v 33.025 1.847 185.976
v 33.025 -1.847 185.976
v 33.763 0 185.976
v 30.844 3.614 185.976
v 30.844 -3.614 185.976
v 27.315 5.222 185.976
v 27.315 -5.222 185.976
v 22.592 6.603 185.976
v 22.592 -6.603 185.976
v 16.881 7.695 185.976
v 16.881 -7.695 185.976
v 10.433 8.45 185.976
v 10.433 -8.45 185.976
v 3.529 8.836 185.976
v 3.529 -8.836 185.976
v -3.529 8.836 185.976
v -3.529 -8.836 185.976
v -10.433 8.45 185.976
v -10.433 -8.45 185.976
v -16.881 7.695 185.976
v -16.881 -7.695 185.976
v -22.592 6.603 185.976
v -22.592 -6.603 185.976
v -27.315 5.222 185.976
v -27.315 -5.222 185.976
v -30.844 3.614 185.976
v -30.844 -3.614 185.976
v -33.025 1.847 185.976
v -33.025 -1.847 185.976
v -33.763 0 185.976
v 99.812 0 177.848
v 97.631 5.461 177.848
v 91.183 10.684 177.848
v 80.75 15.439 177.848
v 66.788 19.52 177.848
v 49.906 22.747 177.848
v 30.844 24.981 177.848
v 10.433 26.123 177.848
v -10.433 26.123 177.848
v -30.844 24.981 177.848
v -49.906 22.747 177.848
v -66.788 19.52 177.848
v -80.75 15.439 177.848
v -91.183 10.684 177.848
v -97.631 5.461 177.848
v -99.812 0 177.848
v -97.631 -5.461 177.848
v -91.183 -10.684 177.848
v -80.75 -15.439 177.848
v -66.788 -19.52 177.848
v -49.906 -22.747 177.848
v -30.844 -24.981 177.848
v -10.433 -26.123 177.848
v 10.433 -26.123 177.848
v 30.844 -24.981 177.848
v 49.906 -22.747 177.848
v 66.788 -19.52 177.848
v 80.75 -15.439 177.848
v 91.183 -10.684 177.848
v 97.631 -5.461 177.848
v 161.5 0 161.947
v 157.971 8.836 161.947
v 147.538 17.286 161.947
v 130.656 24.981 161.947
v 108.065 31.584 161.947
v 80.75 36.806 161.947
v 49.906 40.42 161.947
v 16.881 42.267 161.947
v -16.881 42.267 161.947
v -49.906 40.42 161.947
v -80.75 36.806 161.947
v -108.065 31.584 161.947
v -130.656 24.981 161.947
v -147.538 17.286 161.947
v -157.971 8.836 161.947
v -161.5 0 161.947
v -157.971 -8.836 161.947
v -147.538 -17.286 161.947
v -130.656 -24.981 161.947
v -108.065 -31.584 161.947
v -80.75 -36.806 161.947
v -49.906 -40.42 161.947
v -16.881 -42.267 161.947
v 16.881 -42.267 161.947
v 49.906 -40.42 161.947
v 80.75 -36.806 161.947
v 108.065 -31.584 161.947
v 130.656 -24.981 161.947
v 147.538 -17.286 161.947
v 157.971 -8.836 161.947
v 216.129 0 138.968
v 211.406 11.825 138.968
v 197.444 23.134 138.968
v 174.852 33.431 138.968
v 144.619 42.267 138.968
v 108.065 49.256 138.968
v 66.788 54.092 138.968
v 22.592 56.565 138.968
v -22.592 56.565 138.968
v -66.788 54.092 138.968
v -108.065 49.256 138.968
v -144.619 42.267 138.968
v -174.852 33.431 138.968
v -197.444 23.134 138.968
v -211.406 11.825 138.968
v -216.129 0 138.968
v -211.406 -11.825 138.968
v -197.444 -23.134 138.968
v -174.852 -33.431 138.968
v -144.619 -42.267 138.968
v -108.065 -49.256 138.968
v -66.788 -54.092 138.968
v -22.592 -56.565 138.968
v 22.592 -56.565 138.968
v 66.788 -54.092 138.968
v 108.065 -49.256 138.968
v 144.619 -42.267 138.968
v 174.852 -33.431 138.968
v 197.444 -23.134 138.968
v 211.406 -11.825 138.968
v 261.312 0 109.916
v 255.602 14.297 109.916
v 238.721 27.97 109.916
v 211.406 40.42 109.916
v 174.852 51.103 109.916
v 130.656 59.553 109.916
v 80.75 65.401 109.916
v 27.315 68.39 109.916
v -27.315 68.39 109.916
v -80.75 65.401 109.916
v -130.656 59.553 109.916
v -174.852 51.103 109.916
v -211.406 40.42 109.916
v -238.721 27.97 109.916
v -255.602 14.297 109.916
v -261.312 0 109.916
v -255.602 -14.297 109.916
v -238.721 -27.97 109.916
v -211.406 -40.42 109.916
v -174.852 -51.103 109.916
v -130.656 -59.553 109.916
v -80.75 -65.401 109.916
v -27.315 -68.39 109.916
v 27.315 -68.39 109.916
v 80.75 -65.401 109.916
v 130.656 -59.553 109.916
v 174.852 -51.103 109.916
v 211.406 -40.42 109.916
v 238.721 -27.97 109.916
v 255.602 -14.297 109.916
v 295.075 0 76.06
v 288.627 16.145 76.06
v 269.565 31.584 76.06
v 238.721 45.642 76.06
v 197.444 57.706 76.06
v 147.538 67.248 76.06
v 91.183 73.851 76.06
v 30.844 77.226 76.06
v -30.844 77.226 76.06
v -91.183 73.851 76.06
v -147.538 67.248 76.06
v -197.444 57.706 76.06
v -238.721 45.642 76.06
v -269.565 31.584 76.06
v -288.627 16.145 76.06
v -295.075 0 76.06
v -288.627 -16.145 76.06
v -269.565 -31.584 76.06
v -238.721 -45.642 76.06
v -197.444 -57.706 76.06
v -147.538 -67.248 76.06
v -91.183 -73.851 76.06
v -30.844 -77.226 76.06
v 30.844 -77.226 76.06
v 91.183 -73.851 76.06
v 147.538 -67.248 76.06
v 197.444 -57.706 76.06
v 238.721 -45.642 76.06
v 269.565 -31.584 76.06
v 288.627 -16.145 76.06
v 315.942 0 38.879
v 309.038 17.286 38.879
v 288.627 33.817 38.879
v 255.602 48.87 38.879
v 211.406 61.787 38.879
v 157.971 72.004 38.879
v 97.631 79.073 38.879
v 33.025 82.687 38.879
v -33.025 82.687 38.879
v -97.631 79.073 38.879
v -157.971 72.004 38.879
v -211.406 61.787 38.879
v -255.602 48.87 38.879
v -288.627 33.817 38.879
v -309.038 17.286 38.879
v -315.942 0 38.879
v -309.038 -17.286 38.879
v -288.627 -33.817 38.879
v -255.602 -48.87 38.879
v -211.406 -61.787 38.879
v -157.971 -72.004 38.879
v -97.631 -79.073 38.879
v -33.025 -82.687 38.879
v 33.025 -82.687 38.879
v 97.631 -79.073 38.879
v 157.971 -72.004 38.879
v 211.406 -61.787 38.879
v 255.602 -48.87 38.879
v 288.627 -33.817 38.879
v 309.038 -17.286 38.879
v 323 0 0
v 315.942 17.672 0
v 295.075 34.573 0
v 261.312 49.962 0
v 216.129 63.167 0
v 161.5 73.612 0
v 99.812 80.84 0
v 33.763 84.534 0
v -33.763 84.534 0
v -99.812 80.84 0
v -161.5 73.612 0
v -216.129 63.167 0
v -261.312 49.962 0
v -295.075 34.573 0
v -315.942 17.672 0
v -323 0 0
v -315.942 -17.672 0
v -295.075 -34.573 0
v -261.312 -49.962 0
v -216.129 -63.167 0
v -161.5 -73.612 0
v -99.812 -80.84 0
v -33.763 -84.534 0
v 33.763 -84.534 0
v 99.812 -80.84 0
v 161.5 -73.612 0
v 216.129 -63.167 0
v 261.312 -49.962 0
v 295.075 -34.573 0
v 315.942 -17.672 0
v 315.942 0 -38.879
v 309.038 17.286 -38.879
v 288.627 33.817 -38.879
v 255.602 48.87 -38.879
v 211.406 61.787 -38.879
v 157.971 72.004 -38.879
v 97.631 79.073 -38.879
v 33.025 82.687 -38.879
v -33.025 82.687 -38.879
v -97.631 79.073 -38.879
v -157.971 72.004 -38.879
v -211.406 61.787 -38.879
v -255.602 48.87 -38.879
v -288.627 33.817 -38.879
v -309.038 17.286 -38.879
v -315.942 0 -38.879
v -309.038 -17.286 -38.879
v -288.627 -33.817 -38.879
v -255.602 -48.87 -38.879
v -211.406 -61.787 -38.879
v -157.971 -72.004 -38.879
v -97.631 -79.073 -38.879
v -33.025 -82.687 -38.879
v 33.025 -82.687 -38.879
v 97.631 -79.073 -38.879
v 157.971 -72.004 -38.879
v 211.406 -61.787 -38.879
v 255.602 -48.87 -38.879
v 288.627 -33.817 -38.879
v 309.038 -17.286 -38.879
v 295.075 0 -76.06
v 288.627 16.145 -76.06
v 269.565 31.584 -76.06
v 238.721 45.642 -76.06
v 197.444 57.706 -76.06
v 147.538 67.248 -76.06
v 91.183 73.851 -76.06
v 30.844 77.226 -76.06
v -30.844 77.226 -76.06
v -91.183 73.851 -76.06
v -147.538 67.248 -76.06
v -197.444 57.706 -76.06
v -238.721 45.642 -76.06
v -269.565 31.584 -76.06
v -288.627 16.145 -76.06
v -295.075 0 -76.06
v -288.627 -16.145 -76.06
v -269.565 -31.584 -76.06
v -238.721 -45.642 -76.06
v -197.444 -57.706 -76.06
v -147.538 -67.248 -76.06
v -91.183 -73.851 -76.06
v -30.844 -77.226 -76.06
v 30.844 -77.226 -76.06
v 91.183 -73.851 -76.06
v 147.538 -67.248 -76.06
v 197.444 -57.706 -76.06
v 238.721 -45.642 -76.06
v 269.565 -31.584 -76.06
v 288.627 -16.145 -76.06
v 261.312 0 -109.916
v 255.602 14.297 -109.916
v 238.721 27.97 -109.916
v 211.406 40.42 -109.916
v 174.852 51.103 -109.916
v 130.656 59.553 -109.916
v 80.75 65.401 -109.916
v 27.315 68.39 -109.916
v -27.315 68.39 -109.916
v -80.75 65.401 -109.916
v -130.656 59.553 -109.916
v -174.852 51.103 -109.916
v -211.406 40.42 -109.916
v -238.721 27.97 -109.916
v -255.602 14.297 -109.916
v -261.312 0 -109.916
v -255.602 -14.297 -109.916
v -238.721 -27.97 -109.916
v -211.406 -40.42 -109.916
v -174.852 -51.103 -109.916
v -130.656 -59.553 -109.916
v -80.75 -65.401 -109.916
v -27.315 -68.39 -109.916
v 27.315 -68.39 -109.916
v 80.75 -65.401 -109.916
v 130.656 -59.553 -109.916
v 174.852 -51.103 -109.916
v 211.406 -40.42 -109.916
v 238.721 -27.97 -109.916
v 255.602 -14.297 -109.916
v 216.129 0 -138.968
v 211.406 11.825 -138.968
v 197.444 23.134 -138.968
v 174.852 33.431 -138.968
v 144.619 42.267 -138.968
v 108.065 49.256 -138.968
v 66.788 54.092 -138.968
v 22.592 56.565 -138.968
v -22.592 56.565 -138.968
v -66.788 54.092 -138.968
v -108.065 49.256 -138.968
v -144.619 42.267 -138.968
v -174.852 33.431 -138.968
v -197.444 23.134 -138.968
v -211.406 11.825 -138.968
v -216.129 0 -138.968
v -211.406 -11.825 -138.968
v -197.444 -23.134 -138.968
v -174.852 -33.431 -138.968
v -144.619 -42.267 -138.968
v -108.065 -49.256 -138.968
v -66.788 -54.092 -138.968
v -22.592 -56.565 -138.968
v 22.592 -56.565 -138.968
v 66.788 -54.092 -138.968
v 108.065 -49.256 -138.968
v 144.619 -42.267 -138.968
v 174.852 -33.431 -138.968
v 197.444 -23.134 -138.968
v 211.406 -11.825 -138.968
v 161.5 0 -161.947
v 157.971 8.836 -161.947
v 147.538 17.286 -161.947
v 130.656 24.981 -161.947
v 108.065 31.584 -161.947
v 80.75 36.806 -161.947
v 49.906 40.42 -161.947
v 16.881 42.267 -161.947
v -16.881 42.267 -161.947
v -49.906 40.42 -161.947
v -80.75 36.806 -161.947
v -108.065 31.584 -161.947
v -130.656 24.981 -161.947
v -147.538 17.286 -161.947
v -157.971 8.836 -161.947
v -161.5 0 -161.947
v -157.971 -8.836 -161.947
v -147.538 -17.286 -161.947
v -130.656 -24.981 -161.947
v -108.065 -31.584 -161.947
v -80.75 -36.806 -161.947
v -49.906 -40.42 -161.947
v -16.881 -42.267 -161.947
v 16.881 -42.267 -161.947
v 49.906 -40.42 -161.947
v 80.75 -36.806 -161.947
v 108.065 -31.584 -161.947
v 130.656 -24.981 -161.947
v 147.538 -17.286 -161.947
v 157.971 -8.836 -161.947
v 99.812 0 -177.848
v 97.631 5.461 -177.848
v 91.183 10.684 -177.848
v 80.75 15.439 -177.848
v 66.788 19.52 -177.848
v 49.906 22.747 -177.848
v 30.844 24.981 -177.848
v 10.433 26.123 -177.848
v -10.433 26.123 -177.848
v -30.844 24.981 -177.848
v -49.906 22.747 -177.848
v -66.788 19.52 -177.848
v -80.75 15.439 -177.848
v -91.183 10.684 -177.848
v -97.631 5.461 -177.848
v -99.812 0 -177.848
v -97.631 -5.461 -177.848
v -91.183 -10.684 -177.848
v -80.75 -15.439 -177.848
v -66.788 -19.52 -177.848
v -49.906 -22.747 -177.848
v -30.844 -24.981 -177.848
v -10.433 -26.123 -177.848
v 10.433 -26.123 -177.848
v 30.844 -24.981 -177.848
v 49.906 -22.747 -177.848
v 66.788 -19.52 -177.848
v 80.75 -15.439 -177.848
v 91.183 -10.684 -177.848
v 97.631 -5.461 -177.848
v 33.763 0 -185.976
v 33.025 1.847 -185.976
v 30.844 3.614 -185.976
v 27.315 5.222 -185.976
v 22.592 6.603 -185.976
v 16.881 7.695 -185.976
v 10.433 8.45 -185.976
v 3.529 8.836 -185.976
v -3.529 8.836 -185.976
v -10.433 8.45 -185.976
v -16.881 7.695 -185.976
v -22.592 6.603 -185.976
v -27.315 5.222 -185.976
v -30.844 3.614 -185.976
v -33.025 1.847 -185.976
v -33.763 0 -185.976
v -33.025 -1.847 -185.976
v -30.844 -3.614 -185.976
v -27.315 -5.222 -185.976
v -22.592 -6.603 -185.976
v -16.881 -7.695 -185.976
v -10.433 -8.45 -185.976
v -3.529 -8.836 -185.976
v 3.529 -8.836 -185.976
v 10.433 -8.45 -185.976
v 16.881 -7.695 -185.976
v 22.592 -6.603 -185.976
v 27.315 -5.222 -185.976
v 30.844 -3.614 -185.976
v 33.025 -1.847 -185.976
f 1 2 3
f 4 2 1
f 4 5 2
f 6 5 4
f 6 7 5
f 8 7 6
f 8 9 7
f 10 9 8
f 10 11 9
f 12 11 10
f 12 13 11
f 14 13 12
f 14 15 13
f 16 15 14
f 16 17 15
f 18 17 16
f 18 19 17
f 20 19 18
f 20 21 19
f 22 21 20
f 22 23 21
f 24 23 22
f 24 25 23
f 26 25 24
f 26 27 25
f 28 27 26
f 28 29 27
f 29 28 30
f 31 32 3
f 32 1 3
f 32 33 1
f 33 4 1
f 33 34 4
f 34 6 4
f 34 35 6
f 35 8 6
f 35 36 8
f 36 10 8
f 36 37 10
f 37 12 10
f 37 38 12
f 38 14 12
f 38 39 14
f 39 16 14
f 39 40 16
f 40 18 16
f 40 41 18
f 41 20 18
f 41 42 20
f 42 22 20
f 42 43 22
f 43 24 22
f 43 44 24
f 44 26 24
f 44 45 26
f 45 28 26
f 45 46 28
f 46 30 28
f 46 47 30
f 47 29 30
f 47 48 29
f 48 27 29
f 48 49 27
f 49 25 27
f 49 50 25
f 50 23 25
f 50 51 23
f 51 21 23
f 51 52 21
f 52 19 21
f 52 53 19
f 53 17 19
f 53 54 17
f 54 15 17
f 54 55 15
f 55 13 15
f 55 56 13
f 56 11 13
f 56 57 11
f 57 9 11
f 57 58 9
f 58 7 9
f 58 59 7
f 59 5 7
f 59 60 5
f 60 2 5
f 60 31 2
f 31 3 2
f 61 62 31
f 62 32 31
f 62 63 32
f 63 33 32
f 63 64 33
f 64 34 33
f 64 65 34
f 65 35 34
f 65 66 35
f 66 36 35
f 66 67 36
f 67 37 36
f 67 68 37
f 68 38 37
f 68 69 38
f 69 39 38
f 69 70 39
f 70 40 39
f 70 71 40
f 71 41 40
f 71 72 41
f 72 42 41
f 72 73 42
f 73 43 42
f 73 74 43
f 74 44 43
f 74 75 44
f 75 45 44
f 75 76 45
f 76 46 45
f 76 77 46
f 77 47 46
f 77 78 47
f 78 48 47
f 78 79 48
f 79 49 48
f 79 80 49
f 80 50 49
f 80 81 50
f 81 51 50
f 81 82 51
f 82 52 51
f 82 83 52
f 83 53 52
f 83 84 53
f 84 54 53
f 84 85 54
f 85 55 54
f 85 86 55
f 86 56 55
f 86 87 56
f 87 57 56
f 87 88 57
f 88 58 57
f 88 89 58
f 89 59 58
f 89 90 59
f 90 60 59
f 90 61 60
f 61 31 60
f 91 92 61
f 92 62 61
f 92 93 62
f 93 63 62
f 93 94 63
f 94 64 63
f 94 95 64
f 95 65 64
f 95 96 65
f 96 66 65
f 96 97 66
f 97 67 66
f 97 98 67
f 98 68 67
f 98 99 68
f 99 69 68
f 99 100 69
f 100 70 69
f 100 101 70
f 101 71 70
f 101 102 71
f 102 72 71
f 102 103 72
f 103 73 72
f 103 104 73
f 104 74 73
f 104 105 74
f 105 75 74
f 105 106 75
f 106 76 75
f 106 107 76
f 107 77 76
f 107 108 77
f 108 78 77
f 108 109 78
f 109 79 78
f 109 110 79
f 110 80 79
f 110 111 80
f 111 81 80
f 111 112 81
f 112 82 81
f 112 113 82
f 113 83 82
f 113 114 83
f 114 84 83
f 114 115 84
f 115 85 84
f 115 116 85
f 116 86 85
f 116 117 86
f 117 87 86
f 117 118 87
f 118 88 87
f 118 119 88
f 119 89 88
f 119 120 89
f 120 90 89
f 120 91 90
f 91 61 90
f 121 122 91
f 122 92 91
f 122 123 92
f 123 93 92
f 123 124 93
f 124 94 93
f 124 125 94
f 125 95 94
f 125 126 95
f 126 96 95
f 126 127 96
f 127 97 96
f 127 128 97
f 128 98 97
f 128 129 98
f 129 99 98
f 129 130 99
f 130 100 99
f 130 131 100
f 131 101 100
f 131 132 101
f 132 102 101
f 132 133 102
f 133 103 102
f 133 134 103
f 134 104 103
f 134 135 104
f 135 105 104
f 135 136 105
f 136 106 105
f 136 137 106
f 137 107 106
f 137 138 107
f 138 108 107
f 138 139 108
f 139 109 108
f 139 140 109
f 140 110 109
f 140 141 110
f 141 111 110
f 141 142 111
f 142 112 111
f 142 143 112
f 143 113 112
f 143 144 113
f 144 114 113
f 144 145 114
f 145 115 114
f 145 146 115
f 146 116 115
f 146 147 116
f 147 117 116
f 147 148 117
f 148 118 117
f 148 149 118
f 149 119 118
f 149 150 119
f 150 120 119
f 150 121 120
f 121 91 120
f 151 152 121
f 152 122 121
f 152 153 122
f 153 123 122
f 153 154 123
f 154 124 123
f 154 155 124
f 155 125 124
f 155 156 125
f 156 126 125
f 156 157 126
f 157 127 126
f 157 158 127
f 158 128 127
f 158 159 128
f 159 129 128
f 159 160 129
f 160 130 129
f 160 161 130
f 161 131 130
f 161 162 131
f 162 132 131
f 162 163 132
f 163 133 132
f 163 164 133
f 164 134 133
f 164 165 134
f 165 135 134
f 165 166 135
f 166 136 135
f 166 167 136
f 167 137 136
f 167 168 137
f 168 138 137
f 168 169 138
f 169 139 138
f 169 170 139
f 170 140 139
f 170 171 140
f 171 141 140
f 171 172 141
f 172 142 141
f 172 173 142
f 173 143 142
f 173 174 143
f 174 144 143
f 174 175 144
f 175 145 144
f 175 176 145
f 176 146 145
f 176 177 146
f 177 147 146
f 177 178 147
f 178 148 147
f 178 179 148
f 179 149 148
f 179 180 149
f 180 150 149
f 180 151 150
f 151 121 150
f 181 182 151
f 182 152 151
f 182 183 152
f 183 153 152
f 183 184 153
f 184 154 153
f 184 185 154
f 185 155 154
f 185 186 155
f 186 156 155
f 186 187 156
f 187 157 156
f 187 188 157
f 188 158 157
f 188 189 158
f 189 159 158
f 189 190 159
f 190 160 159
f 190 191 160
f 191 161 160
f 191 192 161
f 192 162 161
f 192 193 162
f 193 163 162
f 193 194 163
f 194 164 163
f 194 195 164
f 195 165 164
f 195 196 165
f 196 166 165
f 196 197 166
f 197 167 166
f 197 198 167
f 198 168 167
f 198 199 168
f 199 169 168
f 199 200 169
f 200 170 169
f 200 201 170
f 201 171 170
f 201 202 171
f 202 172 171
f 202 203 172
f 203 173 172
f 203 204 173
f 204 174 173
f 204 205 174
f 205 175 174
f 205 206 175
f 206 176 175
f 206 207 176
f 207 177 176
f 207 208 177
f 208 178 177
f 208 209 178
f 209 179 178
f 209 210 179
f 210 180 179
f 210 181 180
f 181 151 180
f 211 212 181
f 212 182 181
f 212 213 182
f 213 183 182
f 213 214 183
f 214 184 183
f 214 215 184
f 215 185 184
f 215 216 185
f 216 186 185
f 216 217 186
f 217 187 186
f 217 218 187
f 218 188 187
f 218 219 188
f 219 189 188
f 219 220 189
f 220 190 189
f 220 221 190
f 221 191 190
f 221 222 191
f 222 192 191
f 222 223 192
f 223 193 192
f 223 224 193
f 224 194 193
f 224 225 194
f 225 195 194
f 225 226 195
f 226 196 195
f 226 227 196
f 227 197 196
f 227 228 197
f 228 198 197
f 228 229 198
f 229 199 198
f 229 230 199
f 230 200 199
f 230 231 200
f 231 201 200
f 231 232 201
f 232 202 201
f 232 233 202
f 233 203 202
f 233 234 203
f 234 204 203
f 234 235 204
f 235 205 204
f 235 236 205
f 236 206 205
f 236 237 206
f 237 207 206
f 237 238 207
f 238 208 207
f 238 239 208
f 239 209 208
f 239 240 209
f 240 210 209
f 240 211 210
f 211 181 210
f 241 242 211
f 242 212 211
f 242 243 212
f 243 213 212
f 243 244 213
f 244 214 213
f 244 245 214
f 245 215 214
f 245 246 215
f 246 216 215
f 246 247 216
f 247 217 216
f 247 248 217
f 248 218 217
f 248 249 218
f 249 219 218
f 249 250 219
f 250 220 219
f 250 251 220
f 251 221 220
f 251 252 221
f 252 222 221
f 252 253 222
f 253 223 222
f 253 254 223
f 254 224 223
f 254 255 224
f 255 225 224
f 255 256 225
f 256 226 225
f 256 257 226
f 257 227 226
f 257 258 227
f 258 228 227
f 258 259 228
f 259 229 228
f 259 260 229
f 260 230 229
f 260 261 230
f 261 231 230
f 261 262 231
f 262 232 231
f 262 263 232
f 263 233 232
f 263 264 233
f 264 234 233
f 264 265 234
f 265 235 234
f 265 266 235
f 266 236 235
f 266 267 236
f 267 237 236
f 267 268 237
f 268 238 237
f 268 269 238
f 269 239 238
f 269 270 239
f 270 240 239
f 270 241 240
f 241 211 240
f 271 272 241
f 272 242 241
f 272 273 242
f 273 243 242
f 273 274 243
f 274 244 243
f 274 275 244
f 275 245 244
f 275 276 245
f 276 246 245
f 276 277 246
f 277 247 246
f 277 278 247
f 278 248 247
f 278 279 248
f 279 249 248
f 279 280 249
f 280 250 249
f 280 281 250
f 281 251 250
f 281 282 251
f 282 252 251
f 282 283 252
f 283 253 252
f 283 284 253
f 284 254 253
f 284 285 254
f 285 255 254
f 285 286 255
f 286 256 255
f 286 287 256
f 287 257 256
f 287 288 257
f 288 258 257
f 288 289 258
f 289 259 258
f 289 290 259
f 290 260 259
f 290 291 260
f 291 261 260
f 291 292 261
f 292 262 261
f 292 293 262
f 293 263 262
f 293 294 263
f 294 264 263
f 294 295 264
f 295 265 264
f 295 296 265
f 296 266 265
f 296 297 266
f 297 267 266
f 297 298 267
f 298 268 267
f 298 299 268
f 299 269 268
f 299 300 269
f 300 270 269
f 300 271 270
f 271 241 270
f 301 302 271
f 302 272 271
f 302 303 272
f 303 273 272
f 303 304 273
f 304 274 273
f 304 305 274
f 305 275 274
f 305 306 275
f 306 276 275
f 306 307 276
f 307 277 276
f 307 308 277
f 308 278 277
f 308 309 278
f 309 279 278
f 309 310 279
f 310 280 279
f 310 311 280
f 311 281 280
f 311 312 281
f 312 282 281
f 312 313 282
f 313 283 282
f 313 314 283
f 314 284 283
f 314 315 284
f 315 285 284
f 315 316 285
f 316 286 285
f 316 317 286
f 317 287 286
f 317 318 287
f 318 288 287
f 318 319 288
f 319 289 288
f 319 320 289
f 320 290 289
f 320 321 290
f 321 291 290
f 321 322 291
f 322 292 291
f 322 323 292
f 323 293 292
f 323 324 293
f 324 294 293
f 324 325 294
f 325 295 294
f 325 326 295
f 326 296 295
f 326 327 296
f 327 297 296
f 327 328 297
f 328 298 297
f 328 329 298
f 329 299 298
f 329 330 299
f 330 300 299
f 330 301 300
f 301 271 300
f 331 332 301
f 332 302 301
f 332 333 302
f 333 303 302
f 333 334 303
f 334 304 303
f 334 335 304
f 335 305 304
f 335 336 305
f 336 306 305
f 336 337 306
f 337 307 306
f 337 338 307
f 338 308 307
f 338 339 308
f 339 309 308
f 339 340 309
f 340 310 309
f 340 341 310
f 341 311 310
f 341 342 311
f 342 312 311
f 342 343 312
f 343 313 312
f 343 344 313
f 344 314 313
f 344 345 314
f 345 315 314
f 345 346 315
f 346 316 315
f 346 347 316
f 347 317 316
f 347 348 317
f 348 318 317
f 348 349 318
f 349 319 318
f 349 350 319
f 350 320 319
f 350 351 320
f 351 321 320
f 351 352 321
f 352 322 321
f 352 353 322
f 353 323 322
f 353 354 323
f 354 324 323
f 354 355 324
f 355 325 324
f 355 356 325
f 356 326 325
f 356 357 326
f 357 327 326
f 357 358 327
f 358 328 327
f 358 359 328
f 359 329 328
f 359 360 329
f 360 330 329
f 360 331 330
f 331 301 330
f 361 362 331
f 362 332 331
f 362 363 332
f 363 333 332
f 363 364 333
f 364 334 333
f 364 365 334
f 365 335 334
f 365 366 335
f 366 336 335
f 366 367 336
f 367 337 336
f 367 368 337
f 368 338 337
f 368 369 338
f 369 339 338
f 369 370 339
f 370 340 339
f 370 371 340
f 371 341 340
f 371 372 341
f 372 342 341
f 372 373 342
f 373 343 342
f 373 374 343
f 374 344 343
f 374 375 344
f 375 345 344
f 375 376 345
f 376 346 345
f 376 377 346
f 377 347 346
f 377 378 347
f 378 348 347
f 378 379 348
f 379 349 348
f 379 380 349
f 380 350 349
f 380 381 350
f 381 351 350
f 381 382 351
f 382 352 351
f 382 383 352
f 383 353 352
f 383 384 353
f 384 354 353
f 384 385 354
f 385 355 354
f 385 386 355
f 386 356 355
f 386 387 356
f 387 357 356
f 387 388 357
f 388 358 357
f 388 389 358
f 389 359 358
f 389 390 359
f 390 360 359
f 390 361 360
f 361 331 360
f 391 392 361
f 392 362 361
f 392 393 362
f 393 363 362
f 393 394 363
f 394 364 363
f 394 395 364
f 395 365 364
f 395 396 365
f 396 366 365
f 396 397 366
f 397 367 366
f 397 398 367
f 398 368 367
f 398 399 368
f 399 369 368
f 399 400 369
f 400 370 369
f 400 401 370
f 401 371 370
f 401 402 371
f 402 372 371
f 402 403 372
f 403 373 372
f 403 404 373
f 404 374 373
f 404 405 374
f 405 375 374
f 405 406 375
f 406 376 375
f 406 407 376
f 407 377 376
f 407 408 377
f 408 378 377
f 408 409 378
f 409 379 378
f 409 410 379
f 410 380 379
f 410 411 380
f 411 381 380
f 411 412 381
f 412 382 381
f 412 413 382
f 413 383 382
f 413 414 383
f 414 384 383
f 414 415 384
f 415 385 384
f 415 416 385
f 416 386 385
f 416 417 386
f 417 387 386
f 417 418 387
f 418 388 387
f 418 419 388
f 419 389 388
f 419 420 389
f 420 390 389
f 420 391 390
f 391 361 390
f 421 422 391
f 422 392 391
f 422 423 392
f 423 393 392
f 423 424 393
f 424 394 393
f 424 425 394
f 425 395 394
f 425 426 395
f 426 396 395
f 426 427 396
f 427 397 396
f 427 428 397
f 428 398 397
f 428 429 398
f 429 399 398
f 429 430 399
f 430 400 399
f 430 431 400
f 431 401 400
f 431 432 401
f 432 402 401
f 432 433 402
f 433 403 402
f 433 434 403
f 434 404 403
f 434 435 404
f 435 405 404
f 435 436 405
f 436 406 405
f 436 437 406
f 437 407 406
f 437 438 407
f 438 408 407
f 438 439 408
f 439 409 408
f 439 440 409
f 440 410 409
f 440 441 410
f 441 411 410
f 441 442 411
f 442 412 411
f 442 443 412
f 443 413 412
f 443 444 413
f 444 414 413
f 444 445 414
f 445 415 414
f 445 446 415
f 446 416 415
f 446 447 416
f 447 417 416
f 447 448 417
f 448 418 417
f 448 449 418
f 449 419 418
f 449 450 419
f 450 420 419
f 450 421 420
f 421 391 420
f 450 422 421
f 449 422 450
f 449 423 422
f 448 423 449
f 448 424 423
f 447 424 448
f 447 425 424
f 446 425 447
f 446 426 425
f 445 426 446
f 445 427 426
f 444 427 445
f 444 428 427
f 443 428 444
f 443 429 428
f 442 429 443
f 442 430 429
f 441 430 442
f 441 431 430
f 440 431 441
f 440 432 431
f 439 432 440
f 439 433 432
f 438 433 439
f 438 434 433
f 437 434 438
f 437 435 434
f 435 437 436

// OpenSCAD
// Generated by SolidPython 1.0.1 on 2020-07-29 00:46:53


scale(v = [19, 5, 11]) {
	sphere(r = 17);
}
/***********************************************
*********      SolidPython code:      **********
************************************************
 
# import packages: SolidPython
from solid import *
from solid.utils import *
from itertools import chain, combinations, permutations


class Resize:

    def __init__(self, scad_file):
        self.scad_file = scad_file
        #self.scad_file = import_scad(scad_file)
        # cone/cylinder param:
        self.r1 = 0
        self.r2 = 0
        self.h = 0
        # rectangular prism param:
        self.w = 0
        self.l = 0
        # ellipse param:
        self.r = 0

    # import OpenScad code (file name corresponds to shape)


    # classify shape + parameters
    def assign(self, param1, param2, param3):
        if self.scad_file == 'cone.scad':
            self.r1 = param1
            self.r2 = param2
            self.h = param3
        elif self.scad_file == 'cylinder.scad':
            self.r1 = param1
            self.r2 = param2
            self.h = param3
        elif self.scad_file == 'rectangularPrism.scad':
            self.h = param1
            self.l = param2
            self.w = param3
        else:
            self.r = param1
            self.h = param2

    # resize parameters
    def iterate(self):
        x = range(3, 20, 2)
        i = 1
        if self.scad_file == 'cone.scad':
            tempList = list(permutations(x, 2))
            for temp in tempList:
                param1 = temp[0]
                param2 = temp[1]
                filepath = 'produced_scad_files/' + 'cone' + str(param1) + '_' + str(param2) + '_' + '.scad'
                scad_render_to_file(cylinder(h=param1, r1=param2, r2=0), filepath)

        elif self.scad_file == 'cylinder.scad':
            tempList = list(permutations(x, 3))
            for temp in tempList:
                param1 = temp[0]
                param2 = temp[1]
                filepath = 'produced_scad_files/' + 'cylinder' + str(param1) + '_' + str(param2) + '_' + '.scad'
                scad_render_to_file(cylinder(h=param1, r1=param2, r2=param2), filepath)

        elif self.scad_file == 'rectangularPrism.scad':
            tempList = list(permutations(x, 3))
            for temp in tempList:
                param1 = temp[0]
                param2 = temp[1]
                param3 = temp[2]
                filepath = 'produced_scad_files/' + 'rectangularPrism' + str(param1) + '_' + str(param2) + '_' + str(
                    param3) + '.scad'
                scad_render_to_file(cube(size=(param1, param2, param3)), filepath)

        elif self.scad_file == 'ellipse.scad':
            tempList = list(permutations(x, 4))
            for temp in tempList:
                param1 = temp[0]
                param2 = temp[1]
                param3 = temp[2]
                param4 = temp[3]
                filepath = 'produced_scad_files/' + 'ellipse' + str(param1) + '_' + str(param2) + '_' + str(param3) + '_' + str(param4) + '.scad'
                scad_render_to_file(scale([param1, param2, param3])(sphere(r=param4)), filepath)

    def render_to_scadfile(self):
        scad_render_to_file(scad, 'example.scad') 
 
************************************************/
